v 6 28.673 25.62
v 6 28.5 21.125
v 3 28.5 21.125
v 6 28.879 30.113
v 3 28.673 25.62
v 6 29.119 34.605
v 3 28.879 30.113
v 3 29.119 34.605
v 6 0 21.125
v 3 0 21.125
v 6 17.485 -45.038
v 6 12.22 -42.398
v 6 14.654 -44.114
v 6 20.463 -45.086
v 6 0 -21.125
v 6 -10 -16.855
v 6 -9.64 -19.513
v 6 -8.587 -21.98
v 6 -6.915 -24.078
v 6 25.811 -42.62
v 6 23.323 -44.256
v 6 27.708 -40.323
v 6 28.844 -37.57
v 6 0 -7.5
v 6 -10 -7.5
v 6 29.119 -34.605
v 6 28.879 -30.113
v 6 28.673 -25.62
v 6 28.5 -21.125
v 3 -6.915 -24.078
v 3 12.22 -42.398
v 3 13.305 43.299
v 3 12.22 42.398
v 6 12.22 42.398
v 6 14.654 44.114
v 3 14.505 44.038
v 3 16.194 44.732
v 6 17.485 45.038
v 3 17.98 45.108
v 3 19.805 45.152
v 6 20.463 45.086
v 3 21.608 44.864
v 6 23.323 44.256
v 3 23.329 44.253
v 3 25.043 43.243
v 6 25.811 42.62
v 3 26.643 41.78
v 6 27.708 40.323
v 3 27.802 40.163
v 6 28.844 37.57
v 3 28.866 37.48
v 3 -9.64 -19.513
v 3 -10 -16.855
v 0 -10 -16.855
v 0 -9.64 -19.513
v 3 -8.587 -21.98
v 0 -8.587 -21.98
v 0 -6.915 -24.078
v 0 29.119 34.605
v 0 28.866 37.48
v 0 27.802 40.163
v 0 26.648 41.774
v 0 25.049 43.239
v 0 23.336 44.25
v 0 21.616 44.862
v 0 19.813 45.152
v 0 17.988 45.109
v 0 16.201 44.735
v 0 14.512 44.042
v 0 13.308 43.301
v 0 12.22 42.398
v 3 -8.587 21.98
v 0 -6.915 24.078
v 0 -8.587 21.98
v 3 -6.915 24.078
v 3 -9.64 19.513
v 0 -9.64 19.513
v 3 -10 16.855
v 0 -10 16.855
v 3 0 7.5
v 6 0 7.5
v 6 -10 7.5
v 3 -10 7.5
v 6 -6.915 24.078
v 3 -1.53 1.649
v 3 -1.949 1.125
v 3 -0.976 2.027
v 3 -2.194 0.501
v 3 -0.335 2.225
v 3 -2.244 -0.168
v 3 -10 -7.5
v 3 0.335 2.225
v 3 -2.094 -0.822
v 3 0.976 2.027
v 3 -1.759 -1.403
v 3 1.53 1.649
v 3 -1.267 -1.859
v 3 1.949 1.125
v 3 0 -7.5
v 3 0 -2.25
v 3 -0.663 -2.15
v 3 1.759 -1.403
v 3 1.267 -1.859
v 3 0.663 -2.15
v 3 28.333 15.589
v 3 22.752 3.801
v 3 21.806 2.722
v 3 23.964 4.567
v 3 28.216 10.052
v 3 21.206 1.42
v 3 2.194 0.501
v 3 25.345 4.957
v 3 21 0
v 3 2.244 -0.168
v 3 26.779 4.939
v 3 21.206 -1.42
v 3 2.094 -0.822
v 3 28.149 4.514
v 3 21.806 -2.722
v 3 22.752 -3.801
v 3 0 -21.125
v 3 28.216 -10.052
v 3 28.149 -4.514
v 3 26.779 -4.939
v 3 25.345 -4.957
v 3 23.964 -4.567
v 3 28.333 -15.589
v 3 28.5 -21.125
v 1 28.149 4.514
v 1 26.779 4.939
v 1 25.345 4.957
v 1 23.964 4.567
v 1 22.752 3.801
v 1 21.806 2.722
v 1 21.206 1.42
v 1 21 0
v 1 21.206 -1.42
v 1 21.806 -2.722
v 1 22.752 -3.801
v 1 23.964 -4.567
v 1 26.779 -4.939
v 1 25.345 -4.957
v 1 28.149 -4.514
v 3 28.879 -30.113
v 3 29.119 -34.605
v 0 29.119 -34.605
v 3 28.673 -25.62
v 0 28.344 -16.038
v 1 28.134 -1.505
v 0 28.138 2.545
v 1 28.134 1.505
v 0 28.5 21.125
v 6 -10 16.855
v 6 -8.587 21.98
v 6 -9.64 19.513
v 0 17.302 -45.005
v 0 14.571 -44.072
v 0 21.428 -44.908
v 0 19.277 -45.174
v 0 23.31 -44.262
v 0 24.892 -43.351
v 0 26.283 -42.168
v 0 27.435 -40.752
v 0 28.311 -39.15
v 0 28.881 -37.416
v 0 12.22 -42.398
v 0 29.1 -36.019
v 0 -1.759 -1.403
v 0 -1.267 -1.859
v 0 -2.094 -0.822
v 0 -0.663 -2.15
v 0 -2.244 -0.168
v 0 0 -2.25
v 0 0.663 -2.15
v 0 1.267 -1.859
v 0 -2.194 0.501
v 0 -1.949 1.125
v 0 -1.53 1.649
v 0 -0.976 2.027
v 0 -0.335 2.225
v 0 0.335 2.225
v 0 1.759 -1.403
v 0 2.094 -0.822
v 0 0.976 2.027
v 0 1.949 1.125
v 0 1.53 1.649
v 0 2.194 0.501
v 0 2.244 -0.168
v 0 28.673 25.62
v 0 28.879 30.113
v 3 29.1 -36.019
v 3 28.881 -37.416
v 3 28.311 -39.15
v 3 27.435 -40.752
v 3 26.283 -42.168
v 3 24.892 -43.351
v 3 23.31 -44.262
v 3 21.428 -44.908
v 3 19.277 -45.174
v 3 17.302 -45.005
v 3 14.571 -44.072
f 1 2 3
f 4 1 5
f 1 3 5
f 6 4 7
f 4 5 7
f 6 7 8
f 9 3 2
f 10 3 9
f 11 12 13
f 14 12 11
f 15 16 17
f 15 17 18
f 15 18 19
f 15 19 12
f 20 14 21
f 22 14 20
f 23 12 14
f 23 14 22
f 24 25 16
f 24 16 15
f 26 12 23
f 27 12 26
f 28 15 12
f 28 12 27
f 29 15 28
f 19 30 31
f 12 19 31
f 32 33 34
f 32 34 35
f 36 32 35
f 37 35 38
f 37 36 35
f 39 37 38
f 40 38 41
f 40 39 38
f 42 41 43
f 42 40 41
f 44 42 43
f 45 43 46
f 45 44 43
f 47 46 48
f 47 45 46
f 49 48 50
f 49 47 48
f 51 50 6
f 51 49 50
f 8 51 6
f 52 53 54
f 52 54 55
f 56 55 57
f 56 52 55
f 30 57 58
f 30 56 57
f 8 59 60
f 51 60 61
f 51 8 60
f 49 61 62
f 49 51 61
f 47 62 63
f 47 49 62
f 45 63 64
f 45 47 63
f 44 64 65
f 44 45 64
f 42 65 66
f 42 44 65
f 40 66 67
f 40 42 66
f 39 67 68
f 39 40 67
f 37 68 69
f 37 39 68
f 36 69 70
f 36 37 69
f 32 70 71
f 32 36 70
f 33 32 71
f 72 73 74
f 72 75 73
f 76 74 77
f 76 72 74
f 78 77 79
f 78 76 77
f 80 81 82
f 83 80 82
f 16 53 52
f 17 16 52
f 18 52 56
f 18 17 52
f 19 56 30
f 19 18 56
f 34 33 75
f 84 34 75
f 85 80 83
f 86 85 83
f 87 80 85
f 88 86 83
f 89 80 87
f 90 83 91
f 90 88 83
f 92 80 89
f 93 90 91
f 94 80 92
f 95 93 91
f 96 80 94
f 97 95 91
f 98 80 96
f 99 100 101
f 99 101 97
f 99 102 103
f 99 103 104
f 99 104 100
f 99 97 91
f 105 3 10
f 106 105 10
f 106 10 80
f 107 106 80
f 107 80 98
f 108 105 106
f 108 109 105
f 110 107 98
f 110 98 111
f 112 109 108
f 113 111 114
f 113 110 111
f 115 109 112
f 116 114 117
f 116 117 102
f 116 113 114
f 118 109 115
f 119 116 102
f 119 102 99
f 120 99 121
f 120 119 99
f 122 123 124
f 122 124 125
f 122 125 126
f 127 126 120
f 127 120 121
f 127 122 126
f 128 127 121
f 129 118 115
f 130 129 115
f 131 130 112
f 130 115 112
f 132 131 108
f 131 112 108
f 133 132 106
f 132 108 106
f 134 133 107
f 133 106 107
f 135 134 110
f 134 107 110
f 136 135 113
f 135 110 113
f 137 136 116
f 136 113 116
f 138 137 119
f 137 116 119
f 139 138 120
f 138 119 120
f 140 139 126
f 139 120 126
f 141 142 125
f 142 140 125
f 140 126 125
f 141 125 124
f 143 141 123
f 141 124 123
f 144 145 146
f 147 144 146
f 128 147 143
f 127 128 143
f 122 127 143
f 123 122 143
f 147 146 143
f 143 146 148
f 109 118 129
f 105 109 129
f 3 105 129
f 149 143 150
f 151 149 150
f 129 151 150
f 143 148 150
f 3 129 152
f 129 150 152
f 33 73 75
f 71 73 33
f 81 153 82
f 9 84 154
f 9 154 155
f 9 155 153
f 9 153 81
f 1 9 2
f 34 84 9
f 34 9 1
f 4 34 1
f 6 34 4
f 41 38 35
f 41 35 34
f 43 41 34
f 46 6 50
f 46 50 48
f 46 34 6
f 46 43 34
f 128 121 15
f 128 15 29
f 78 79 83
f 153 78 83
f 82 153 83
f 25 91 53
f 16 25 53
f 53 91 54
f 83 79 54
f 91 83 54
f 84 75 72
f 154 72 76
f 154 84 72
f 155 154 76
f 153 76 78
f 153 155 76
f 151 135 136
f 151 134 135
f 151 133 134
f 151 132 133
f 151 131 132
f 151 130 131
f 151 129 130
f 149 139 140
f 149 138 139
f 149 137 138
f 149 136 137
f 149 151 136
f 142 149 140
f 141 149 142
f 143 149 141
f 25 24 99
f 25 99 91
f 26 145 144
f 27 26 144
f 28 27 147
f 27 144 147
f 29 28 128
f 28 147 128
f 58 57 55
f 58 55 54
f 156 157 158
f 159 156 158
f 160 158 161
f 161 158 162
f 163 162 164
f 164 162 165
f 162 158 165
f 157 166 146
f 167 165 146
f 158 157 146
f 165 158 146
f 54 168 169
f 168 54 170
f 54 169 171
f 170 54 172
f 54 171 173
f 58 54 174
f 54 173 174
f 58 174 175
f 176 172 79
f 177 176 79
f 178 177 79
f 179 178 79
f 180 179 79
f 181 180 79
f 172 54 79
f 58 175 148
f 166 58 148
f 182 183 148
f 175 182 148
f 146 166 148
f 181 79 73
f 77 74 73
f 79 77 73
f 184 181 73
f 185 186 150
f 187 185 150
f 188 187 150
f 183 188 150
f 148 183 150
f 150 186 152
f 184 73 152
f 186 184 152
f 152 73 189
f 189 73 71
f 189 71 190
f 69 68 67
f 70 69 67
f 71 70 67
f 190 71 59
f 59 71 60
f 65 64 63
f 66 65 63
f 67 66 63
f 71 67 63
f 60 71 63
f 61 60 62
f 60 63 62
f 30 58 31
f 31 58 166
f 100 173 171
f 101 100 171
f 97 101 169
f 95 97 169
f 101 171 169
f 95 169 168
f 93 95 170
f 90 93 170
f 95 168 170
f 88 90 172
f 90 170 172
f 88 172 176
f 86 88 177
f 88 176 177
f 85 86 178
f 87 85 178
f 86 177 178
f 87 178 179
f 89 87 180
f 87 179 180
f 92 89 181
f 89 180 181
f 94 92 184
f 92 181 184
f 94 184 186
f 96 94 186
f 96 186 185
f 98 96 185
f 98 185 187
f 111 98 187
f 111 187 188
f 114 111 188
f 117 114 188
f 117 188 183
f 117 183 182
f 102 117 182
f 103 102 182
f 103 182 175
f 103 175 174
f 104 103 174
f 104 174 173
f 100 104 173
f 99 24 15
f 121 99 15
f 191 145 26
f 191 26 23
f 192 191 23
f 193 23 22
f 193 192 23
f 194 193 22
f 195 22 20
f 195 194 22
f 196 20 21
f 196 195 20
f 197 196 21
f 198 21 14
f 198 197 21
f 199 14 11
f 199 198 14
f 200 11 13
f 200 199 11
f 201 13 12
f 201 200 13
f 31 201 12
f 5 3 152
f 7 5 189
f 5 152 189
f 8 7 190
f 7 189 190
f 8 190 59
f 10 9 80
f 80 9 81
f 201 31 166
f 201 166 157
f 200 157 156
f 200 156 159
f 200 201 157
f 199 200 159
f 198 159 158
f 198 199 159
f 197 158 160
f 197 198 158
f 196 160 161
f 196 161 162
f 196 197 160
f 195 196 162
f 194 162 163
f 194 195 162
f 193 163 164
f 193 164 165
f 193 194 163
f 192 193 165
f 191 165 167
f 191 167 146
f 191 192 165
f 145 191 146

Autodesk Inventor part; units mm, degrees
ref_plane "YZ Plane" through (0, 0, 0) normal (1, 0, 0) x (0, 1, 0)
ref_plane "XZ Plane" through (0, 0, 0) normal (0, 1, 0) x (-1, 0, 0)
ref_plane "XY Plane" through (0, 0, 0) normal (0, 0, 1) x (1, 0, 0)
sketch "Sketch1" plane through (0, 0, 0) normal (1, 0, 0) x (0, 1, 0)
  line L0 (10, 21.125) -> (-10, 21.125)
  line L1 (-10, 21.125) -> (-10, -21.125)
  line L2 (-10, -21.125) -> (10, -21.125)
  line L3 (10, -21.125) -> (10, 21.125)
  line L4 (10, 21.125) -> (-10, -21.125) construction
  line L5 (-10, 21.125) -> (10, -21.125) construction
  point P0 (0, 0)
  dimension "d0" = 42.25
  dimension "d1" = 20
extrude "Extrusion1" add sketch "Sketch1" along normal blind 6
sketch "Sketch2" plane through (6, 0, 0) normal (1, 0, 0) x (0, 0, -1)
  line L0 (-21.125, 0) -> (-7.5, 0)
  line L1 (-7.5, 0) -> (-7.5, -10)
  line L2 (-21.125, -10) -> (21.125, -10) projected
  line L3 (7.5, 0) -> (21.125, 0)
  line L4 (21.125, -10) -> (21.125, 10) projected
  line L5 (7.5, 0) -> (7.5, -10.6285)
  line L6 (-21.125, -10) -> (21.125, -10) projected
  line L7 (21.125, -10) -> (21.125, 10) projected
  line L8 (21.125, 10) -> (-21.125, 10) projected
  line L9 (-21.125, 10) -> (-21.125, -10) projected
  point P0 (0, 0)
  point P1 (0, -10)
  point P2 (-21.125, 0)
  point P3 (7.5, -10)
  dimension "d4" = 15
  dimension "d6" = 10
  dimension "d7" = 7.5
extrude "Extrusion2" cut sketch "Sketch2" against normal blind 3 contours L9 L8 L4 L3 L5 L2 L1 L0
sketch "Sketch4" plane through (0, 0, 0) normal (-1, 0, 0) x (0, 0, 1)
  arc A0 (21.125, 28.5) -> (190.4596, 58.7605) centre (0, 635.6334) ccw projected
  circle A1 centre (0, 635.6334) radius 607.5008
  circle A2 centre (0, 635.6334) radius 607.5008
  circle A3 centre (0, 635.6334) radius 617.5008
  line L0 (21.125, 0) -> (21.125, -10) projected
  line L1 (21.125, -10) -> (50, 20.1602)
  line L2 (-7.5, -10) -> (-21.125, -10) projected
  line L3 (-21.125, -10) -> (-50, 20.1602)
  line L4 (-50, 20.1602) -> (-50, 30.1937)
  line L5 (50, 20.1602) -> (50, 30.1937)
  line L6 (21.125, -10) -> (-21.125, -10) projected
  point P0 (0, 0)
  dimension "d17" = 0
  dimension "d18" = 10
  dimension "d19" = 100
extrude "Extrusion3" add sketch "Sketch4" against normal blind 3 contours A0 L5 A3 L4 A1 | L1 L6 L2 L3 A3 picked at (-31.0009, 22.4071)
fillet "Fillet1" radius 10 4 edges at (1.5, 20.1602, 50) (1.5, 20.1602, -50) (1.5, 30.1937, -50) (1.5, 30.1937, 50)
sketch "Sketch3" plane through (3, 0, 0) normal (1, 0, 0) x (0, 0, -1)
  point P0 (0, 0)
  point P1 (0, 0)
  point P2 (7.5, 0)
hole "Hole1" at (3, 0, 0) direction (-1, 0, 0) diameter 4.5 end through all
sketch "Sketch5" plane through (3, 0, 0) normal (1, 0, 0) x (0, 0, -1)
  line L0 (-21.125, -10) -> (-7.5, -10) projected
  line L1 (-21.125, -10) -> (21.125, -10)
  line L2 (21.125, -10) -> (21.125, 40)
  line L3 (21.125, 40) -> (-21.125, 40)
  line L4 (-21.125, 40) -> (-21.125, -10)
  arc A0 (-34.605, 29.119) -> (-42.3979, 12.2197) centre (-35.1746, 19.1352) ccw projected
  line L5 (-42.3979, 12.2197) -> (-21.125, -10) projected
  line L6 (-21.125, 0) -> (-21.125, -10) projected
  line L7 (-7.5, 0) -> (-21.125, 0) projected
  line L8 (-7.5, -10) -> (-7.5, 0) projected
  line L9 (7.5, -10) -> (-7.5, -10) projected
  line L10 (7.5, 0) -> (7.5, -10) projected
  line L11 (21.125, 0) -> (7.5, 0) projected
  line L12 (21.125, -10) -> (21.125, 0) projected
  line L13 (21.125, -10) -> (42.3979, 12.2197) projected
  arc A1 (42.3979, 12.2197) -> (34.605, 29.119) centre (35.1746, 19.1352) ccw projected
  arc A2 (-34.605, 29.119) -> (34.605, 29.119) centre (0, 635.6334) ccw projected
  circle A3 centre (0, 0) radius 2.25 projected
  point P0 (21.125, 28.5)
  point P1 (-21.125, 28.5)
  dimension "d26" = 50
extrude "Extrusion4" add sketch "Sketch5" along normal up to surface (3 mm away) contours L5 A0 A2 L4 | L2 A2 A1 L13
sketch "Sketch6" plane through (3, 0, 0) normal (1, 0, 0) x (0, 0, -1)
  circle A0 centre (0, 26) radius 5
  point P0 (0, 0)
  dimension "d27" = 26
  dimension "d28" = 10
extrude "Extrusion5" cut sketch "Sketch6" against normal blind 2
fillet "Fillet2" radius 10 2 edges at (3, -10, -21.125) (3, -10, 21.125)
equation "\"d7\" = 0.5 * d4"
properties part number "base_cover_3DPrint"
